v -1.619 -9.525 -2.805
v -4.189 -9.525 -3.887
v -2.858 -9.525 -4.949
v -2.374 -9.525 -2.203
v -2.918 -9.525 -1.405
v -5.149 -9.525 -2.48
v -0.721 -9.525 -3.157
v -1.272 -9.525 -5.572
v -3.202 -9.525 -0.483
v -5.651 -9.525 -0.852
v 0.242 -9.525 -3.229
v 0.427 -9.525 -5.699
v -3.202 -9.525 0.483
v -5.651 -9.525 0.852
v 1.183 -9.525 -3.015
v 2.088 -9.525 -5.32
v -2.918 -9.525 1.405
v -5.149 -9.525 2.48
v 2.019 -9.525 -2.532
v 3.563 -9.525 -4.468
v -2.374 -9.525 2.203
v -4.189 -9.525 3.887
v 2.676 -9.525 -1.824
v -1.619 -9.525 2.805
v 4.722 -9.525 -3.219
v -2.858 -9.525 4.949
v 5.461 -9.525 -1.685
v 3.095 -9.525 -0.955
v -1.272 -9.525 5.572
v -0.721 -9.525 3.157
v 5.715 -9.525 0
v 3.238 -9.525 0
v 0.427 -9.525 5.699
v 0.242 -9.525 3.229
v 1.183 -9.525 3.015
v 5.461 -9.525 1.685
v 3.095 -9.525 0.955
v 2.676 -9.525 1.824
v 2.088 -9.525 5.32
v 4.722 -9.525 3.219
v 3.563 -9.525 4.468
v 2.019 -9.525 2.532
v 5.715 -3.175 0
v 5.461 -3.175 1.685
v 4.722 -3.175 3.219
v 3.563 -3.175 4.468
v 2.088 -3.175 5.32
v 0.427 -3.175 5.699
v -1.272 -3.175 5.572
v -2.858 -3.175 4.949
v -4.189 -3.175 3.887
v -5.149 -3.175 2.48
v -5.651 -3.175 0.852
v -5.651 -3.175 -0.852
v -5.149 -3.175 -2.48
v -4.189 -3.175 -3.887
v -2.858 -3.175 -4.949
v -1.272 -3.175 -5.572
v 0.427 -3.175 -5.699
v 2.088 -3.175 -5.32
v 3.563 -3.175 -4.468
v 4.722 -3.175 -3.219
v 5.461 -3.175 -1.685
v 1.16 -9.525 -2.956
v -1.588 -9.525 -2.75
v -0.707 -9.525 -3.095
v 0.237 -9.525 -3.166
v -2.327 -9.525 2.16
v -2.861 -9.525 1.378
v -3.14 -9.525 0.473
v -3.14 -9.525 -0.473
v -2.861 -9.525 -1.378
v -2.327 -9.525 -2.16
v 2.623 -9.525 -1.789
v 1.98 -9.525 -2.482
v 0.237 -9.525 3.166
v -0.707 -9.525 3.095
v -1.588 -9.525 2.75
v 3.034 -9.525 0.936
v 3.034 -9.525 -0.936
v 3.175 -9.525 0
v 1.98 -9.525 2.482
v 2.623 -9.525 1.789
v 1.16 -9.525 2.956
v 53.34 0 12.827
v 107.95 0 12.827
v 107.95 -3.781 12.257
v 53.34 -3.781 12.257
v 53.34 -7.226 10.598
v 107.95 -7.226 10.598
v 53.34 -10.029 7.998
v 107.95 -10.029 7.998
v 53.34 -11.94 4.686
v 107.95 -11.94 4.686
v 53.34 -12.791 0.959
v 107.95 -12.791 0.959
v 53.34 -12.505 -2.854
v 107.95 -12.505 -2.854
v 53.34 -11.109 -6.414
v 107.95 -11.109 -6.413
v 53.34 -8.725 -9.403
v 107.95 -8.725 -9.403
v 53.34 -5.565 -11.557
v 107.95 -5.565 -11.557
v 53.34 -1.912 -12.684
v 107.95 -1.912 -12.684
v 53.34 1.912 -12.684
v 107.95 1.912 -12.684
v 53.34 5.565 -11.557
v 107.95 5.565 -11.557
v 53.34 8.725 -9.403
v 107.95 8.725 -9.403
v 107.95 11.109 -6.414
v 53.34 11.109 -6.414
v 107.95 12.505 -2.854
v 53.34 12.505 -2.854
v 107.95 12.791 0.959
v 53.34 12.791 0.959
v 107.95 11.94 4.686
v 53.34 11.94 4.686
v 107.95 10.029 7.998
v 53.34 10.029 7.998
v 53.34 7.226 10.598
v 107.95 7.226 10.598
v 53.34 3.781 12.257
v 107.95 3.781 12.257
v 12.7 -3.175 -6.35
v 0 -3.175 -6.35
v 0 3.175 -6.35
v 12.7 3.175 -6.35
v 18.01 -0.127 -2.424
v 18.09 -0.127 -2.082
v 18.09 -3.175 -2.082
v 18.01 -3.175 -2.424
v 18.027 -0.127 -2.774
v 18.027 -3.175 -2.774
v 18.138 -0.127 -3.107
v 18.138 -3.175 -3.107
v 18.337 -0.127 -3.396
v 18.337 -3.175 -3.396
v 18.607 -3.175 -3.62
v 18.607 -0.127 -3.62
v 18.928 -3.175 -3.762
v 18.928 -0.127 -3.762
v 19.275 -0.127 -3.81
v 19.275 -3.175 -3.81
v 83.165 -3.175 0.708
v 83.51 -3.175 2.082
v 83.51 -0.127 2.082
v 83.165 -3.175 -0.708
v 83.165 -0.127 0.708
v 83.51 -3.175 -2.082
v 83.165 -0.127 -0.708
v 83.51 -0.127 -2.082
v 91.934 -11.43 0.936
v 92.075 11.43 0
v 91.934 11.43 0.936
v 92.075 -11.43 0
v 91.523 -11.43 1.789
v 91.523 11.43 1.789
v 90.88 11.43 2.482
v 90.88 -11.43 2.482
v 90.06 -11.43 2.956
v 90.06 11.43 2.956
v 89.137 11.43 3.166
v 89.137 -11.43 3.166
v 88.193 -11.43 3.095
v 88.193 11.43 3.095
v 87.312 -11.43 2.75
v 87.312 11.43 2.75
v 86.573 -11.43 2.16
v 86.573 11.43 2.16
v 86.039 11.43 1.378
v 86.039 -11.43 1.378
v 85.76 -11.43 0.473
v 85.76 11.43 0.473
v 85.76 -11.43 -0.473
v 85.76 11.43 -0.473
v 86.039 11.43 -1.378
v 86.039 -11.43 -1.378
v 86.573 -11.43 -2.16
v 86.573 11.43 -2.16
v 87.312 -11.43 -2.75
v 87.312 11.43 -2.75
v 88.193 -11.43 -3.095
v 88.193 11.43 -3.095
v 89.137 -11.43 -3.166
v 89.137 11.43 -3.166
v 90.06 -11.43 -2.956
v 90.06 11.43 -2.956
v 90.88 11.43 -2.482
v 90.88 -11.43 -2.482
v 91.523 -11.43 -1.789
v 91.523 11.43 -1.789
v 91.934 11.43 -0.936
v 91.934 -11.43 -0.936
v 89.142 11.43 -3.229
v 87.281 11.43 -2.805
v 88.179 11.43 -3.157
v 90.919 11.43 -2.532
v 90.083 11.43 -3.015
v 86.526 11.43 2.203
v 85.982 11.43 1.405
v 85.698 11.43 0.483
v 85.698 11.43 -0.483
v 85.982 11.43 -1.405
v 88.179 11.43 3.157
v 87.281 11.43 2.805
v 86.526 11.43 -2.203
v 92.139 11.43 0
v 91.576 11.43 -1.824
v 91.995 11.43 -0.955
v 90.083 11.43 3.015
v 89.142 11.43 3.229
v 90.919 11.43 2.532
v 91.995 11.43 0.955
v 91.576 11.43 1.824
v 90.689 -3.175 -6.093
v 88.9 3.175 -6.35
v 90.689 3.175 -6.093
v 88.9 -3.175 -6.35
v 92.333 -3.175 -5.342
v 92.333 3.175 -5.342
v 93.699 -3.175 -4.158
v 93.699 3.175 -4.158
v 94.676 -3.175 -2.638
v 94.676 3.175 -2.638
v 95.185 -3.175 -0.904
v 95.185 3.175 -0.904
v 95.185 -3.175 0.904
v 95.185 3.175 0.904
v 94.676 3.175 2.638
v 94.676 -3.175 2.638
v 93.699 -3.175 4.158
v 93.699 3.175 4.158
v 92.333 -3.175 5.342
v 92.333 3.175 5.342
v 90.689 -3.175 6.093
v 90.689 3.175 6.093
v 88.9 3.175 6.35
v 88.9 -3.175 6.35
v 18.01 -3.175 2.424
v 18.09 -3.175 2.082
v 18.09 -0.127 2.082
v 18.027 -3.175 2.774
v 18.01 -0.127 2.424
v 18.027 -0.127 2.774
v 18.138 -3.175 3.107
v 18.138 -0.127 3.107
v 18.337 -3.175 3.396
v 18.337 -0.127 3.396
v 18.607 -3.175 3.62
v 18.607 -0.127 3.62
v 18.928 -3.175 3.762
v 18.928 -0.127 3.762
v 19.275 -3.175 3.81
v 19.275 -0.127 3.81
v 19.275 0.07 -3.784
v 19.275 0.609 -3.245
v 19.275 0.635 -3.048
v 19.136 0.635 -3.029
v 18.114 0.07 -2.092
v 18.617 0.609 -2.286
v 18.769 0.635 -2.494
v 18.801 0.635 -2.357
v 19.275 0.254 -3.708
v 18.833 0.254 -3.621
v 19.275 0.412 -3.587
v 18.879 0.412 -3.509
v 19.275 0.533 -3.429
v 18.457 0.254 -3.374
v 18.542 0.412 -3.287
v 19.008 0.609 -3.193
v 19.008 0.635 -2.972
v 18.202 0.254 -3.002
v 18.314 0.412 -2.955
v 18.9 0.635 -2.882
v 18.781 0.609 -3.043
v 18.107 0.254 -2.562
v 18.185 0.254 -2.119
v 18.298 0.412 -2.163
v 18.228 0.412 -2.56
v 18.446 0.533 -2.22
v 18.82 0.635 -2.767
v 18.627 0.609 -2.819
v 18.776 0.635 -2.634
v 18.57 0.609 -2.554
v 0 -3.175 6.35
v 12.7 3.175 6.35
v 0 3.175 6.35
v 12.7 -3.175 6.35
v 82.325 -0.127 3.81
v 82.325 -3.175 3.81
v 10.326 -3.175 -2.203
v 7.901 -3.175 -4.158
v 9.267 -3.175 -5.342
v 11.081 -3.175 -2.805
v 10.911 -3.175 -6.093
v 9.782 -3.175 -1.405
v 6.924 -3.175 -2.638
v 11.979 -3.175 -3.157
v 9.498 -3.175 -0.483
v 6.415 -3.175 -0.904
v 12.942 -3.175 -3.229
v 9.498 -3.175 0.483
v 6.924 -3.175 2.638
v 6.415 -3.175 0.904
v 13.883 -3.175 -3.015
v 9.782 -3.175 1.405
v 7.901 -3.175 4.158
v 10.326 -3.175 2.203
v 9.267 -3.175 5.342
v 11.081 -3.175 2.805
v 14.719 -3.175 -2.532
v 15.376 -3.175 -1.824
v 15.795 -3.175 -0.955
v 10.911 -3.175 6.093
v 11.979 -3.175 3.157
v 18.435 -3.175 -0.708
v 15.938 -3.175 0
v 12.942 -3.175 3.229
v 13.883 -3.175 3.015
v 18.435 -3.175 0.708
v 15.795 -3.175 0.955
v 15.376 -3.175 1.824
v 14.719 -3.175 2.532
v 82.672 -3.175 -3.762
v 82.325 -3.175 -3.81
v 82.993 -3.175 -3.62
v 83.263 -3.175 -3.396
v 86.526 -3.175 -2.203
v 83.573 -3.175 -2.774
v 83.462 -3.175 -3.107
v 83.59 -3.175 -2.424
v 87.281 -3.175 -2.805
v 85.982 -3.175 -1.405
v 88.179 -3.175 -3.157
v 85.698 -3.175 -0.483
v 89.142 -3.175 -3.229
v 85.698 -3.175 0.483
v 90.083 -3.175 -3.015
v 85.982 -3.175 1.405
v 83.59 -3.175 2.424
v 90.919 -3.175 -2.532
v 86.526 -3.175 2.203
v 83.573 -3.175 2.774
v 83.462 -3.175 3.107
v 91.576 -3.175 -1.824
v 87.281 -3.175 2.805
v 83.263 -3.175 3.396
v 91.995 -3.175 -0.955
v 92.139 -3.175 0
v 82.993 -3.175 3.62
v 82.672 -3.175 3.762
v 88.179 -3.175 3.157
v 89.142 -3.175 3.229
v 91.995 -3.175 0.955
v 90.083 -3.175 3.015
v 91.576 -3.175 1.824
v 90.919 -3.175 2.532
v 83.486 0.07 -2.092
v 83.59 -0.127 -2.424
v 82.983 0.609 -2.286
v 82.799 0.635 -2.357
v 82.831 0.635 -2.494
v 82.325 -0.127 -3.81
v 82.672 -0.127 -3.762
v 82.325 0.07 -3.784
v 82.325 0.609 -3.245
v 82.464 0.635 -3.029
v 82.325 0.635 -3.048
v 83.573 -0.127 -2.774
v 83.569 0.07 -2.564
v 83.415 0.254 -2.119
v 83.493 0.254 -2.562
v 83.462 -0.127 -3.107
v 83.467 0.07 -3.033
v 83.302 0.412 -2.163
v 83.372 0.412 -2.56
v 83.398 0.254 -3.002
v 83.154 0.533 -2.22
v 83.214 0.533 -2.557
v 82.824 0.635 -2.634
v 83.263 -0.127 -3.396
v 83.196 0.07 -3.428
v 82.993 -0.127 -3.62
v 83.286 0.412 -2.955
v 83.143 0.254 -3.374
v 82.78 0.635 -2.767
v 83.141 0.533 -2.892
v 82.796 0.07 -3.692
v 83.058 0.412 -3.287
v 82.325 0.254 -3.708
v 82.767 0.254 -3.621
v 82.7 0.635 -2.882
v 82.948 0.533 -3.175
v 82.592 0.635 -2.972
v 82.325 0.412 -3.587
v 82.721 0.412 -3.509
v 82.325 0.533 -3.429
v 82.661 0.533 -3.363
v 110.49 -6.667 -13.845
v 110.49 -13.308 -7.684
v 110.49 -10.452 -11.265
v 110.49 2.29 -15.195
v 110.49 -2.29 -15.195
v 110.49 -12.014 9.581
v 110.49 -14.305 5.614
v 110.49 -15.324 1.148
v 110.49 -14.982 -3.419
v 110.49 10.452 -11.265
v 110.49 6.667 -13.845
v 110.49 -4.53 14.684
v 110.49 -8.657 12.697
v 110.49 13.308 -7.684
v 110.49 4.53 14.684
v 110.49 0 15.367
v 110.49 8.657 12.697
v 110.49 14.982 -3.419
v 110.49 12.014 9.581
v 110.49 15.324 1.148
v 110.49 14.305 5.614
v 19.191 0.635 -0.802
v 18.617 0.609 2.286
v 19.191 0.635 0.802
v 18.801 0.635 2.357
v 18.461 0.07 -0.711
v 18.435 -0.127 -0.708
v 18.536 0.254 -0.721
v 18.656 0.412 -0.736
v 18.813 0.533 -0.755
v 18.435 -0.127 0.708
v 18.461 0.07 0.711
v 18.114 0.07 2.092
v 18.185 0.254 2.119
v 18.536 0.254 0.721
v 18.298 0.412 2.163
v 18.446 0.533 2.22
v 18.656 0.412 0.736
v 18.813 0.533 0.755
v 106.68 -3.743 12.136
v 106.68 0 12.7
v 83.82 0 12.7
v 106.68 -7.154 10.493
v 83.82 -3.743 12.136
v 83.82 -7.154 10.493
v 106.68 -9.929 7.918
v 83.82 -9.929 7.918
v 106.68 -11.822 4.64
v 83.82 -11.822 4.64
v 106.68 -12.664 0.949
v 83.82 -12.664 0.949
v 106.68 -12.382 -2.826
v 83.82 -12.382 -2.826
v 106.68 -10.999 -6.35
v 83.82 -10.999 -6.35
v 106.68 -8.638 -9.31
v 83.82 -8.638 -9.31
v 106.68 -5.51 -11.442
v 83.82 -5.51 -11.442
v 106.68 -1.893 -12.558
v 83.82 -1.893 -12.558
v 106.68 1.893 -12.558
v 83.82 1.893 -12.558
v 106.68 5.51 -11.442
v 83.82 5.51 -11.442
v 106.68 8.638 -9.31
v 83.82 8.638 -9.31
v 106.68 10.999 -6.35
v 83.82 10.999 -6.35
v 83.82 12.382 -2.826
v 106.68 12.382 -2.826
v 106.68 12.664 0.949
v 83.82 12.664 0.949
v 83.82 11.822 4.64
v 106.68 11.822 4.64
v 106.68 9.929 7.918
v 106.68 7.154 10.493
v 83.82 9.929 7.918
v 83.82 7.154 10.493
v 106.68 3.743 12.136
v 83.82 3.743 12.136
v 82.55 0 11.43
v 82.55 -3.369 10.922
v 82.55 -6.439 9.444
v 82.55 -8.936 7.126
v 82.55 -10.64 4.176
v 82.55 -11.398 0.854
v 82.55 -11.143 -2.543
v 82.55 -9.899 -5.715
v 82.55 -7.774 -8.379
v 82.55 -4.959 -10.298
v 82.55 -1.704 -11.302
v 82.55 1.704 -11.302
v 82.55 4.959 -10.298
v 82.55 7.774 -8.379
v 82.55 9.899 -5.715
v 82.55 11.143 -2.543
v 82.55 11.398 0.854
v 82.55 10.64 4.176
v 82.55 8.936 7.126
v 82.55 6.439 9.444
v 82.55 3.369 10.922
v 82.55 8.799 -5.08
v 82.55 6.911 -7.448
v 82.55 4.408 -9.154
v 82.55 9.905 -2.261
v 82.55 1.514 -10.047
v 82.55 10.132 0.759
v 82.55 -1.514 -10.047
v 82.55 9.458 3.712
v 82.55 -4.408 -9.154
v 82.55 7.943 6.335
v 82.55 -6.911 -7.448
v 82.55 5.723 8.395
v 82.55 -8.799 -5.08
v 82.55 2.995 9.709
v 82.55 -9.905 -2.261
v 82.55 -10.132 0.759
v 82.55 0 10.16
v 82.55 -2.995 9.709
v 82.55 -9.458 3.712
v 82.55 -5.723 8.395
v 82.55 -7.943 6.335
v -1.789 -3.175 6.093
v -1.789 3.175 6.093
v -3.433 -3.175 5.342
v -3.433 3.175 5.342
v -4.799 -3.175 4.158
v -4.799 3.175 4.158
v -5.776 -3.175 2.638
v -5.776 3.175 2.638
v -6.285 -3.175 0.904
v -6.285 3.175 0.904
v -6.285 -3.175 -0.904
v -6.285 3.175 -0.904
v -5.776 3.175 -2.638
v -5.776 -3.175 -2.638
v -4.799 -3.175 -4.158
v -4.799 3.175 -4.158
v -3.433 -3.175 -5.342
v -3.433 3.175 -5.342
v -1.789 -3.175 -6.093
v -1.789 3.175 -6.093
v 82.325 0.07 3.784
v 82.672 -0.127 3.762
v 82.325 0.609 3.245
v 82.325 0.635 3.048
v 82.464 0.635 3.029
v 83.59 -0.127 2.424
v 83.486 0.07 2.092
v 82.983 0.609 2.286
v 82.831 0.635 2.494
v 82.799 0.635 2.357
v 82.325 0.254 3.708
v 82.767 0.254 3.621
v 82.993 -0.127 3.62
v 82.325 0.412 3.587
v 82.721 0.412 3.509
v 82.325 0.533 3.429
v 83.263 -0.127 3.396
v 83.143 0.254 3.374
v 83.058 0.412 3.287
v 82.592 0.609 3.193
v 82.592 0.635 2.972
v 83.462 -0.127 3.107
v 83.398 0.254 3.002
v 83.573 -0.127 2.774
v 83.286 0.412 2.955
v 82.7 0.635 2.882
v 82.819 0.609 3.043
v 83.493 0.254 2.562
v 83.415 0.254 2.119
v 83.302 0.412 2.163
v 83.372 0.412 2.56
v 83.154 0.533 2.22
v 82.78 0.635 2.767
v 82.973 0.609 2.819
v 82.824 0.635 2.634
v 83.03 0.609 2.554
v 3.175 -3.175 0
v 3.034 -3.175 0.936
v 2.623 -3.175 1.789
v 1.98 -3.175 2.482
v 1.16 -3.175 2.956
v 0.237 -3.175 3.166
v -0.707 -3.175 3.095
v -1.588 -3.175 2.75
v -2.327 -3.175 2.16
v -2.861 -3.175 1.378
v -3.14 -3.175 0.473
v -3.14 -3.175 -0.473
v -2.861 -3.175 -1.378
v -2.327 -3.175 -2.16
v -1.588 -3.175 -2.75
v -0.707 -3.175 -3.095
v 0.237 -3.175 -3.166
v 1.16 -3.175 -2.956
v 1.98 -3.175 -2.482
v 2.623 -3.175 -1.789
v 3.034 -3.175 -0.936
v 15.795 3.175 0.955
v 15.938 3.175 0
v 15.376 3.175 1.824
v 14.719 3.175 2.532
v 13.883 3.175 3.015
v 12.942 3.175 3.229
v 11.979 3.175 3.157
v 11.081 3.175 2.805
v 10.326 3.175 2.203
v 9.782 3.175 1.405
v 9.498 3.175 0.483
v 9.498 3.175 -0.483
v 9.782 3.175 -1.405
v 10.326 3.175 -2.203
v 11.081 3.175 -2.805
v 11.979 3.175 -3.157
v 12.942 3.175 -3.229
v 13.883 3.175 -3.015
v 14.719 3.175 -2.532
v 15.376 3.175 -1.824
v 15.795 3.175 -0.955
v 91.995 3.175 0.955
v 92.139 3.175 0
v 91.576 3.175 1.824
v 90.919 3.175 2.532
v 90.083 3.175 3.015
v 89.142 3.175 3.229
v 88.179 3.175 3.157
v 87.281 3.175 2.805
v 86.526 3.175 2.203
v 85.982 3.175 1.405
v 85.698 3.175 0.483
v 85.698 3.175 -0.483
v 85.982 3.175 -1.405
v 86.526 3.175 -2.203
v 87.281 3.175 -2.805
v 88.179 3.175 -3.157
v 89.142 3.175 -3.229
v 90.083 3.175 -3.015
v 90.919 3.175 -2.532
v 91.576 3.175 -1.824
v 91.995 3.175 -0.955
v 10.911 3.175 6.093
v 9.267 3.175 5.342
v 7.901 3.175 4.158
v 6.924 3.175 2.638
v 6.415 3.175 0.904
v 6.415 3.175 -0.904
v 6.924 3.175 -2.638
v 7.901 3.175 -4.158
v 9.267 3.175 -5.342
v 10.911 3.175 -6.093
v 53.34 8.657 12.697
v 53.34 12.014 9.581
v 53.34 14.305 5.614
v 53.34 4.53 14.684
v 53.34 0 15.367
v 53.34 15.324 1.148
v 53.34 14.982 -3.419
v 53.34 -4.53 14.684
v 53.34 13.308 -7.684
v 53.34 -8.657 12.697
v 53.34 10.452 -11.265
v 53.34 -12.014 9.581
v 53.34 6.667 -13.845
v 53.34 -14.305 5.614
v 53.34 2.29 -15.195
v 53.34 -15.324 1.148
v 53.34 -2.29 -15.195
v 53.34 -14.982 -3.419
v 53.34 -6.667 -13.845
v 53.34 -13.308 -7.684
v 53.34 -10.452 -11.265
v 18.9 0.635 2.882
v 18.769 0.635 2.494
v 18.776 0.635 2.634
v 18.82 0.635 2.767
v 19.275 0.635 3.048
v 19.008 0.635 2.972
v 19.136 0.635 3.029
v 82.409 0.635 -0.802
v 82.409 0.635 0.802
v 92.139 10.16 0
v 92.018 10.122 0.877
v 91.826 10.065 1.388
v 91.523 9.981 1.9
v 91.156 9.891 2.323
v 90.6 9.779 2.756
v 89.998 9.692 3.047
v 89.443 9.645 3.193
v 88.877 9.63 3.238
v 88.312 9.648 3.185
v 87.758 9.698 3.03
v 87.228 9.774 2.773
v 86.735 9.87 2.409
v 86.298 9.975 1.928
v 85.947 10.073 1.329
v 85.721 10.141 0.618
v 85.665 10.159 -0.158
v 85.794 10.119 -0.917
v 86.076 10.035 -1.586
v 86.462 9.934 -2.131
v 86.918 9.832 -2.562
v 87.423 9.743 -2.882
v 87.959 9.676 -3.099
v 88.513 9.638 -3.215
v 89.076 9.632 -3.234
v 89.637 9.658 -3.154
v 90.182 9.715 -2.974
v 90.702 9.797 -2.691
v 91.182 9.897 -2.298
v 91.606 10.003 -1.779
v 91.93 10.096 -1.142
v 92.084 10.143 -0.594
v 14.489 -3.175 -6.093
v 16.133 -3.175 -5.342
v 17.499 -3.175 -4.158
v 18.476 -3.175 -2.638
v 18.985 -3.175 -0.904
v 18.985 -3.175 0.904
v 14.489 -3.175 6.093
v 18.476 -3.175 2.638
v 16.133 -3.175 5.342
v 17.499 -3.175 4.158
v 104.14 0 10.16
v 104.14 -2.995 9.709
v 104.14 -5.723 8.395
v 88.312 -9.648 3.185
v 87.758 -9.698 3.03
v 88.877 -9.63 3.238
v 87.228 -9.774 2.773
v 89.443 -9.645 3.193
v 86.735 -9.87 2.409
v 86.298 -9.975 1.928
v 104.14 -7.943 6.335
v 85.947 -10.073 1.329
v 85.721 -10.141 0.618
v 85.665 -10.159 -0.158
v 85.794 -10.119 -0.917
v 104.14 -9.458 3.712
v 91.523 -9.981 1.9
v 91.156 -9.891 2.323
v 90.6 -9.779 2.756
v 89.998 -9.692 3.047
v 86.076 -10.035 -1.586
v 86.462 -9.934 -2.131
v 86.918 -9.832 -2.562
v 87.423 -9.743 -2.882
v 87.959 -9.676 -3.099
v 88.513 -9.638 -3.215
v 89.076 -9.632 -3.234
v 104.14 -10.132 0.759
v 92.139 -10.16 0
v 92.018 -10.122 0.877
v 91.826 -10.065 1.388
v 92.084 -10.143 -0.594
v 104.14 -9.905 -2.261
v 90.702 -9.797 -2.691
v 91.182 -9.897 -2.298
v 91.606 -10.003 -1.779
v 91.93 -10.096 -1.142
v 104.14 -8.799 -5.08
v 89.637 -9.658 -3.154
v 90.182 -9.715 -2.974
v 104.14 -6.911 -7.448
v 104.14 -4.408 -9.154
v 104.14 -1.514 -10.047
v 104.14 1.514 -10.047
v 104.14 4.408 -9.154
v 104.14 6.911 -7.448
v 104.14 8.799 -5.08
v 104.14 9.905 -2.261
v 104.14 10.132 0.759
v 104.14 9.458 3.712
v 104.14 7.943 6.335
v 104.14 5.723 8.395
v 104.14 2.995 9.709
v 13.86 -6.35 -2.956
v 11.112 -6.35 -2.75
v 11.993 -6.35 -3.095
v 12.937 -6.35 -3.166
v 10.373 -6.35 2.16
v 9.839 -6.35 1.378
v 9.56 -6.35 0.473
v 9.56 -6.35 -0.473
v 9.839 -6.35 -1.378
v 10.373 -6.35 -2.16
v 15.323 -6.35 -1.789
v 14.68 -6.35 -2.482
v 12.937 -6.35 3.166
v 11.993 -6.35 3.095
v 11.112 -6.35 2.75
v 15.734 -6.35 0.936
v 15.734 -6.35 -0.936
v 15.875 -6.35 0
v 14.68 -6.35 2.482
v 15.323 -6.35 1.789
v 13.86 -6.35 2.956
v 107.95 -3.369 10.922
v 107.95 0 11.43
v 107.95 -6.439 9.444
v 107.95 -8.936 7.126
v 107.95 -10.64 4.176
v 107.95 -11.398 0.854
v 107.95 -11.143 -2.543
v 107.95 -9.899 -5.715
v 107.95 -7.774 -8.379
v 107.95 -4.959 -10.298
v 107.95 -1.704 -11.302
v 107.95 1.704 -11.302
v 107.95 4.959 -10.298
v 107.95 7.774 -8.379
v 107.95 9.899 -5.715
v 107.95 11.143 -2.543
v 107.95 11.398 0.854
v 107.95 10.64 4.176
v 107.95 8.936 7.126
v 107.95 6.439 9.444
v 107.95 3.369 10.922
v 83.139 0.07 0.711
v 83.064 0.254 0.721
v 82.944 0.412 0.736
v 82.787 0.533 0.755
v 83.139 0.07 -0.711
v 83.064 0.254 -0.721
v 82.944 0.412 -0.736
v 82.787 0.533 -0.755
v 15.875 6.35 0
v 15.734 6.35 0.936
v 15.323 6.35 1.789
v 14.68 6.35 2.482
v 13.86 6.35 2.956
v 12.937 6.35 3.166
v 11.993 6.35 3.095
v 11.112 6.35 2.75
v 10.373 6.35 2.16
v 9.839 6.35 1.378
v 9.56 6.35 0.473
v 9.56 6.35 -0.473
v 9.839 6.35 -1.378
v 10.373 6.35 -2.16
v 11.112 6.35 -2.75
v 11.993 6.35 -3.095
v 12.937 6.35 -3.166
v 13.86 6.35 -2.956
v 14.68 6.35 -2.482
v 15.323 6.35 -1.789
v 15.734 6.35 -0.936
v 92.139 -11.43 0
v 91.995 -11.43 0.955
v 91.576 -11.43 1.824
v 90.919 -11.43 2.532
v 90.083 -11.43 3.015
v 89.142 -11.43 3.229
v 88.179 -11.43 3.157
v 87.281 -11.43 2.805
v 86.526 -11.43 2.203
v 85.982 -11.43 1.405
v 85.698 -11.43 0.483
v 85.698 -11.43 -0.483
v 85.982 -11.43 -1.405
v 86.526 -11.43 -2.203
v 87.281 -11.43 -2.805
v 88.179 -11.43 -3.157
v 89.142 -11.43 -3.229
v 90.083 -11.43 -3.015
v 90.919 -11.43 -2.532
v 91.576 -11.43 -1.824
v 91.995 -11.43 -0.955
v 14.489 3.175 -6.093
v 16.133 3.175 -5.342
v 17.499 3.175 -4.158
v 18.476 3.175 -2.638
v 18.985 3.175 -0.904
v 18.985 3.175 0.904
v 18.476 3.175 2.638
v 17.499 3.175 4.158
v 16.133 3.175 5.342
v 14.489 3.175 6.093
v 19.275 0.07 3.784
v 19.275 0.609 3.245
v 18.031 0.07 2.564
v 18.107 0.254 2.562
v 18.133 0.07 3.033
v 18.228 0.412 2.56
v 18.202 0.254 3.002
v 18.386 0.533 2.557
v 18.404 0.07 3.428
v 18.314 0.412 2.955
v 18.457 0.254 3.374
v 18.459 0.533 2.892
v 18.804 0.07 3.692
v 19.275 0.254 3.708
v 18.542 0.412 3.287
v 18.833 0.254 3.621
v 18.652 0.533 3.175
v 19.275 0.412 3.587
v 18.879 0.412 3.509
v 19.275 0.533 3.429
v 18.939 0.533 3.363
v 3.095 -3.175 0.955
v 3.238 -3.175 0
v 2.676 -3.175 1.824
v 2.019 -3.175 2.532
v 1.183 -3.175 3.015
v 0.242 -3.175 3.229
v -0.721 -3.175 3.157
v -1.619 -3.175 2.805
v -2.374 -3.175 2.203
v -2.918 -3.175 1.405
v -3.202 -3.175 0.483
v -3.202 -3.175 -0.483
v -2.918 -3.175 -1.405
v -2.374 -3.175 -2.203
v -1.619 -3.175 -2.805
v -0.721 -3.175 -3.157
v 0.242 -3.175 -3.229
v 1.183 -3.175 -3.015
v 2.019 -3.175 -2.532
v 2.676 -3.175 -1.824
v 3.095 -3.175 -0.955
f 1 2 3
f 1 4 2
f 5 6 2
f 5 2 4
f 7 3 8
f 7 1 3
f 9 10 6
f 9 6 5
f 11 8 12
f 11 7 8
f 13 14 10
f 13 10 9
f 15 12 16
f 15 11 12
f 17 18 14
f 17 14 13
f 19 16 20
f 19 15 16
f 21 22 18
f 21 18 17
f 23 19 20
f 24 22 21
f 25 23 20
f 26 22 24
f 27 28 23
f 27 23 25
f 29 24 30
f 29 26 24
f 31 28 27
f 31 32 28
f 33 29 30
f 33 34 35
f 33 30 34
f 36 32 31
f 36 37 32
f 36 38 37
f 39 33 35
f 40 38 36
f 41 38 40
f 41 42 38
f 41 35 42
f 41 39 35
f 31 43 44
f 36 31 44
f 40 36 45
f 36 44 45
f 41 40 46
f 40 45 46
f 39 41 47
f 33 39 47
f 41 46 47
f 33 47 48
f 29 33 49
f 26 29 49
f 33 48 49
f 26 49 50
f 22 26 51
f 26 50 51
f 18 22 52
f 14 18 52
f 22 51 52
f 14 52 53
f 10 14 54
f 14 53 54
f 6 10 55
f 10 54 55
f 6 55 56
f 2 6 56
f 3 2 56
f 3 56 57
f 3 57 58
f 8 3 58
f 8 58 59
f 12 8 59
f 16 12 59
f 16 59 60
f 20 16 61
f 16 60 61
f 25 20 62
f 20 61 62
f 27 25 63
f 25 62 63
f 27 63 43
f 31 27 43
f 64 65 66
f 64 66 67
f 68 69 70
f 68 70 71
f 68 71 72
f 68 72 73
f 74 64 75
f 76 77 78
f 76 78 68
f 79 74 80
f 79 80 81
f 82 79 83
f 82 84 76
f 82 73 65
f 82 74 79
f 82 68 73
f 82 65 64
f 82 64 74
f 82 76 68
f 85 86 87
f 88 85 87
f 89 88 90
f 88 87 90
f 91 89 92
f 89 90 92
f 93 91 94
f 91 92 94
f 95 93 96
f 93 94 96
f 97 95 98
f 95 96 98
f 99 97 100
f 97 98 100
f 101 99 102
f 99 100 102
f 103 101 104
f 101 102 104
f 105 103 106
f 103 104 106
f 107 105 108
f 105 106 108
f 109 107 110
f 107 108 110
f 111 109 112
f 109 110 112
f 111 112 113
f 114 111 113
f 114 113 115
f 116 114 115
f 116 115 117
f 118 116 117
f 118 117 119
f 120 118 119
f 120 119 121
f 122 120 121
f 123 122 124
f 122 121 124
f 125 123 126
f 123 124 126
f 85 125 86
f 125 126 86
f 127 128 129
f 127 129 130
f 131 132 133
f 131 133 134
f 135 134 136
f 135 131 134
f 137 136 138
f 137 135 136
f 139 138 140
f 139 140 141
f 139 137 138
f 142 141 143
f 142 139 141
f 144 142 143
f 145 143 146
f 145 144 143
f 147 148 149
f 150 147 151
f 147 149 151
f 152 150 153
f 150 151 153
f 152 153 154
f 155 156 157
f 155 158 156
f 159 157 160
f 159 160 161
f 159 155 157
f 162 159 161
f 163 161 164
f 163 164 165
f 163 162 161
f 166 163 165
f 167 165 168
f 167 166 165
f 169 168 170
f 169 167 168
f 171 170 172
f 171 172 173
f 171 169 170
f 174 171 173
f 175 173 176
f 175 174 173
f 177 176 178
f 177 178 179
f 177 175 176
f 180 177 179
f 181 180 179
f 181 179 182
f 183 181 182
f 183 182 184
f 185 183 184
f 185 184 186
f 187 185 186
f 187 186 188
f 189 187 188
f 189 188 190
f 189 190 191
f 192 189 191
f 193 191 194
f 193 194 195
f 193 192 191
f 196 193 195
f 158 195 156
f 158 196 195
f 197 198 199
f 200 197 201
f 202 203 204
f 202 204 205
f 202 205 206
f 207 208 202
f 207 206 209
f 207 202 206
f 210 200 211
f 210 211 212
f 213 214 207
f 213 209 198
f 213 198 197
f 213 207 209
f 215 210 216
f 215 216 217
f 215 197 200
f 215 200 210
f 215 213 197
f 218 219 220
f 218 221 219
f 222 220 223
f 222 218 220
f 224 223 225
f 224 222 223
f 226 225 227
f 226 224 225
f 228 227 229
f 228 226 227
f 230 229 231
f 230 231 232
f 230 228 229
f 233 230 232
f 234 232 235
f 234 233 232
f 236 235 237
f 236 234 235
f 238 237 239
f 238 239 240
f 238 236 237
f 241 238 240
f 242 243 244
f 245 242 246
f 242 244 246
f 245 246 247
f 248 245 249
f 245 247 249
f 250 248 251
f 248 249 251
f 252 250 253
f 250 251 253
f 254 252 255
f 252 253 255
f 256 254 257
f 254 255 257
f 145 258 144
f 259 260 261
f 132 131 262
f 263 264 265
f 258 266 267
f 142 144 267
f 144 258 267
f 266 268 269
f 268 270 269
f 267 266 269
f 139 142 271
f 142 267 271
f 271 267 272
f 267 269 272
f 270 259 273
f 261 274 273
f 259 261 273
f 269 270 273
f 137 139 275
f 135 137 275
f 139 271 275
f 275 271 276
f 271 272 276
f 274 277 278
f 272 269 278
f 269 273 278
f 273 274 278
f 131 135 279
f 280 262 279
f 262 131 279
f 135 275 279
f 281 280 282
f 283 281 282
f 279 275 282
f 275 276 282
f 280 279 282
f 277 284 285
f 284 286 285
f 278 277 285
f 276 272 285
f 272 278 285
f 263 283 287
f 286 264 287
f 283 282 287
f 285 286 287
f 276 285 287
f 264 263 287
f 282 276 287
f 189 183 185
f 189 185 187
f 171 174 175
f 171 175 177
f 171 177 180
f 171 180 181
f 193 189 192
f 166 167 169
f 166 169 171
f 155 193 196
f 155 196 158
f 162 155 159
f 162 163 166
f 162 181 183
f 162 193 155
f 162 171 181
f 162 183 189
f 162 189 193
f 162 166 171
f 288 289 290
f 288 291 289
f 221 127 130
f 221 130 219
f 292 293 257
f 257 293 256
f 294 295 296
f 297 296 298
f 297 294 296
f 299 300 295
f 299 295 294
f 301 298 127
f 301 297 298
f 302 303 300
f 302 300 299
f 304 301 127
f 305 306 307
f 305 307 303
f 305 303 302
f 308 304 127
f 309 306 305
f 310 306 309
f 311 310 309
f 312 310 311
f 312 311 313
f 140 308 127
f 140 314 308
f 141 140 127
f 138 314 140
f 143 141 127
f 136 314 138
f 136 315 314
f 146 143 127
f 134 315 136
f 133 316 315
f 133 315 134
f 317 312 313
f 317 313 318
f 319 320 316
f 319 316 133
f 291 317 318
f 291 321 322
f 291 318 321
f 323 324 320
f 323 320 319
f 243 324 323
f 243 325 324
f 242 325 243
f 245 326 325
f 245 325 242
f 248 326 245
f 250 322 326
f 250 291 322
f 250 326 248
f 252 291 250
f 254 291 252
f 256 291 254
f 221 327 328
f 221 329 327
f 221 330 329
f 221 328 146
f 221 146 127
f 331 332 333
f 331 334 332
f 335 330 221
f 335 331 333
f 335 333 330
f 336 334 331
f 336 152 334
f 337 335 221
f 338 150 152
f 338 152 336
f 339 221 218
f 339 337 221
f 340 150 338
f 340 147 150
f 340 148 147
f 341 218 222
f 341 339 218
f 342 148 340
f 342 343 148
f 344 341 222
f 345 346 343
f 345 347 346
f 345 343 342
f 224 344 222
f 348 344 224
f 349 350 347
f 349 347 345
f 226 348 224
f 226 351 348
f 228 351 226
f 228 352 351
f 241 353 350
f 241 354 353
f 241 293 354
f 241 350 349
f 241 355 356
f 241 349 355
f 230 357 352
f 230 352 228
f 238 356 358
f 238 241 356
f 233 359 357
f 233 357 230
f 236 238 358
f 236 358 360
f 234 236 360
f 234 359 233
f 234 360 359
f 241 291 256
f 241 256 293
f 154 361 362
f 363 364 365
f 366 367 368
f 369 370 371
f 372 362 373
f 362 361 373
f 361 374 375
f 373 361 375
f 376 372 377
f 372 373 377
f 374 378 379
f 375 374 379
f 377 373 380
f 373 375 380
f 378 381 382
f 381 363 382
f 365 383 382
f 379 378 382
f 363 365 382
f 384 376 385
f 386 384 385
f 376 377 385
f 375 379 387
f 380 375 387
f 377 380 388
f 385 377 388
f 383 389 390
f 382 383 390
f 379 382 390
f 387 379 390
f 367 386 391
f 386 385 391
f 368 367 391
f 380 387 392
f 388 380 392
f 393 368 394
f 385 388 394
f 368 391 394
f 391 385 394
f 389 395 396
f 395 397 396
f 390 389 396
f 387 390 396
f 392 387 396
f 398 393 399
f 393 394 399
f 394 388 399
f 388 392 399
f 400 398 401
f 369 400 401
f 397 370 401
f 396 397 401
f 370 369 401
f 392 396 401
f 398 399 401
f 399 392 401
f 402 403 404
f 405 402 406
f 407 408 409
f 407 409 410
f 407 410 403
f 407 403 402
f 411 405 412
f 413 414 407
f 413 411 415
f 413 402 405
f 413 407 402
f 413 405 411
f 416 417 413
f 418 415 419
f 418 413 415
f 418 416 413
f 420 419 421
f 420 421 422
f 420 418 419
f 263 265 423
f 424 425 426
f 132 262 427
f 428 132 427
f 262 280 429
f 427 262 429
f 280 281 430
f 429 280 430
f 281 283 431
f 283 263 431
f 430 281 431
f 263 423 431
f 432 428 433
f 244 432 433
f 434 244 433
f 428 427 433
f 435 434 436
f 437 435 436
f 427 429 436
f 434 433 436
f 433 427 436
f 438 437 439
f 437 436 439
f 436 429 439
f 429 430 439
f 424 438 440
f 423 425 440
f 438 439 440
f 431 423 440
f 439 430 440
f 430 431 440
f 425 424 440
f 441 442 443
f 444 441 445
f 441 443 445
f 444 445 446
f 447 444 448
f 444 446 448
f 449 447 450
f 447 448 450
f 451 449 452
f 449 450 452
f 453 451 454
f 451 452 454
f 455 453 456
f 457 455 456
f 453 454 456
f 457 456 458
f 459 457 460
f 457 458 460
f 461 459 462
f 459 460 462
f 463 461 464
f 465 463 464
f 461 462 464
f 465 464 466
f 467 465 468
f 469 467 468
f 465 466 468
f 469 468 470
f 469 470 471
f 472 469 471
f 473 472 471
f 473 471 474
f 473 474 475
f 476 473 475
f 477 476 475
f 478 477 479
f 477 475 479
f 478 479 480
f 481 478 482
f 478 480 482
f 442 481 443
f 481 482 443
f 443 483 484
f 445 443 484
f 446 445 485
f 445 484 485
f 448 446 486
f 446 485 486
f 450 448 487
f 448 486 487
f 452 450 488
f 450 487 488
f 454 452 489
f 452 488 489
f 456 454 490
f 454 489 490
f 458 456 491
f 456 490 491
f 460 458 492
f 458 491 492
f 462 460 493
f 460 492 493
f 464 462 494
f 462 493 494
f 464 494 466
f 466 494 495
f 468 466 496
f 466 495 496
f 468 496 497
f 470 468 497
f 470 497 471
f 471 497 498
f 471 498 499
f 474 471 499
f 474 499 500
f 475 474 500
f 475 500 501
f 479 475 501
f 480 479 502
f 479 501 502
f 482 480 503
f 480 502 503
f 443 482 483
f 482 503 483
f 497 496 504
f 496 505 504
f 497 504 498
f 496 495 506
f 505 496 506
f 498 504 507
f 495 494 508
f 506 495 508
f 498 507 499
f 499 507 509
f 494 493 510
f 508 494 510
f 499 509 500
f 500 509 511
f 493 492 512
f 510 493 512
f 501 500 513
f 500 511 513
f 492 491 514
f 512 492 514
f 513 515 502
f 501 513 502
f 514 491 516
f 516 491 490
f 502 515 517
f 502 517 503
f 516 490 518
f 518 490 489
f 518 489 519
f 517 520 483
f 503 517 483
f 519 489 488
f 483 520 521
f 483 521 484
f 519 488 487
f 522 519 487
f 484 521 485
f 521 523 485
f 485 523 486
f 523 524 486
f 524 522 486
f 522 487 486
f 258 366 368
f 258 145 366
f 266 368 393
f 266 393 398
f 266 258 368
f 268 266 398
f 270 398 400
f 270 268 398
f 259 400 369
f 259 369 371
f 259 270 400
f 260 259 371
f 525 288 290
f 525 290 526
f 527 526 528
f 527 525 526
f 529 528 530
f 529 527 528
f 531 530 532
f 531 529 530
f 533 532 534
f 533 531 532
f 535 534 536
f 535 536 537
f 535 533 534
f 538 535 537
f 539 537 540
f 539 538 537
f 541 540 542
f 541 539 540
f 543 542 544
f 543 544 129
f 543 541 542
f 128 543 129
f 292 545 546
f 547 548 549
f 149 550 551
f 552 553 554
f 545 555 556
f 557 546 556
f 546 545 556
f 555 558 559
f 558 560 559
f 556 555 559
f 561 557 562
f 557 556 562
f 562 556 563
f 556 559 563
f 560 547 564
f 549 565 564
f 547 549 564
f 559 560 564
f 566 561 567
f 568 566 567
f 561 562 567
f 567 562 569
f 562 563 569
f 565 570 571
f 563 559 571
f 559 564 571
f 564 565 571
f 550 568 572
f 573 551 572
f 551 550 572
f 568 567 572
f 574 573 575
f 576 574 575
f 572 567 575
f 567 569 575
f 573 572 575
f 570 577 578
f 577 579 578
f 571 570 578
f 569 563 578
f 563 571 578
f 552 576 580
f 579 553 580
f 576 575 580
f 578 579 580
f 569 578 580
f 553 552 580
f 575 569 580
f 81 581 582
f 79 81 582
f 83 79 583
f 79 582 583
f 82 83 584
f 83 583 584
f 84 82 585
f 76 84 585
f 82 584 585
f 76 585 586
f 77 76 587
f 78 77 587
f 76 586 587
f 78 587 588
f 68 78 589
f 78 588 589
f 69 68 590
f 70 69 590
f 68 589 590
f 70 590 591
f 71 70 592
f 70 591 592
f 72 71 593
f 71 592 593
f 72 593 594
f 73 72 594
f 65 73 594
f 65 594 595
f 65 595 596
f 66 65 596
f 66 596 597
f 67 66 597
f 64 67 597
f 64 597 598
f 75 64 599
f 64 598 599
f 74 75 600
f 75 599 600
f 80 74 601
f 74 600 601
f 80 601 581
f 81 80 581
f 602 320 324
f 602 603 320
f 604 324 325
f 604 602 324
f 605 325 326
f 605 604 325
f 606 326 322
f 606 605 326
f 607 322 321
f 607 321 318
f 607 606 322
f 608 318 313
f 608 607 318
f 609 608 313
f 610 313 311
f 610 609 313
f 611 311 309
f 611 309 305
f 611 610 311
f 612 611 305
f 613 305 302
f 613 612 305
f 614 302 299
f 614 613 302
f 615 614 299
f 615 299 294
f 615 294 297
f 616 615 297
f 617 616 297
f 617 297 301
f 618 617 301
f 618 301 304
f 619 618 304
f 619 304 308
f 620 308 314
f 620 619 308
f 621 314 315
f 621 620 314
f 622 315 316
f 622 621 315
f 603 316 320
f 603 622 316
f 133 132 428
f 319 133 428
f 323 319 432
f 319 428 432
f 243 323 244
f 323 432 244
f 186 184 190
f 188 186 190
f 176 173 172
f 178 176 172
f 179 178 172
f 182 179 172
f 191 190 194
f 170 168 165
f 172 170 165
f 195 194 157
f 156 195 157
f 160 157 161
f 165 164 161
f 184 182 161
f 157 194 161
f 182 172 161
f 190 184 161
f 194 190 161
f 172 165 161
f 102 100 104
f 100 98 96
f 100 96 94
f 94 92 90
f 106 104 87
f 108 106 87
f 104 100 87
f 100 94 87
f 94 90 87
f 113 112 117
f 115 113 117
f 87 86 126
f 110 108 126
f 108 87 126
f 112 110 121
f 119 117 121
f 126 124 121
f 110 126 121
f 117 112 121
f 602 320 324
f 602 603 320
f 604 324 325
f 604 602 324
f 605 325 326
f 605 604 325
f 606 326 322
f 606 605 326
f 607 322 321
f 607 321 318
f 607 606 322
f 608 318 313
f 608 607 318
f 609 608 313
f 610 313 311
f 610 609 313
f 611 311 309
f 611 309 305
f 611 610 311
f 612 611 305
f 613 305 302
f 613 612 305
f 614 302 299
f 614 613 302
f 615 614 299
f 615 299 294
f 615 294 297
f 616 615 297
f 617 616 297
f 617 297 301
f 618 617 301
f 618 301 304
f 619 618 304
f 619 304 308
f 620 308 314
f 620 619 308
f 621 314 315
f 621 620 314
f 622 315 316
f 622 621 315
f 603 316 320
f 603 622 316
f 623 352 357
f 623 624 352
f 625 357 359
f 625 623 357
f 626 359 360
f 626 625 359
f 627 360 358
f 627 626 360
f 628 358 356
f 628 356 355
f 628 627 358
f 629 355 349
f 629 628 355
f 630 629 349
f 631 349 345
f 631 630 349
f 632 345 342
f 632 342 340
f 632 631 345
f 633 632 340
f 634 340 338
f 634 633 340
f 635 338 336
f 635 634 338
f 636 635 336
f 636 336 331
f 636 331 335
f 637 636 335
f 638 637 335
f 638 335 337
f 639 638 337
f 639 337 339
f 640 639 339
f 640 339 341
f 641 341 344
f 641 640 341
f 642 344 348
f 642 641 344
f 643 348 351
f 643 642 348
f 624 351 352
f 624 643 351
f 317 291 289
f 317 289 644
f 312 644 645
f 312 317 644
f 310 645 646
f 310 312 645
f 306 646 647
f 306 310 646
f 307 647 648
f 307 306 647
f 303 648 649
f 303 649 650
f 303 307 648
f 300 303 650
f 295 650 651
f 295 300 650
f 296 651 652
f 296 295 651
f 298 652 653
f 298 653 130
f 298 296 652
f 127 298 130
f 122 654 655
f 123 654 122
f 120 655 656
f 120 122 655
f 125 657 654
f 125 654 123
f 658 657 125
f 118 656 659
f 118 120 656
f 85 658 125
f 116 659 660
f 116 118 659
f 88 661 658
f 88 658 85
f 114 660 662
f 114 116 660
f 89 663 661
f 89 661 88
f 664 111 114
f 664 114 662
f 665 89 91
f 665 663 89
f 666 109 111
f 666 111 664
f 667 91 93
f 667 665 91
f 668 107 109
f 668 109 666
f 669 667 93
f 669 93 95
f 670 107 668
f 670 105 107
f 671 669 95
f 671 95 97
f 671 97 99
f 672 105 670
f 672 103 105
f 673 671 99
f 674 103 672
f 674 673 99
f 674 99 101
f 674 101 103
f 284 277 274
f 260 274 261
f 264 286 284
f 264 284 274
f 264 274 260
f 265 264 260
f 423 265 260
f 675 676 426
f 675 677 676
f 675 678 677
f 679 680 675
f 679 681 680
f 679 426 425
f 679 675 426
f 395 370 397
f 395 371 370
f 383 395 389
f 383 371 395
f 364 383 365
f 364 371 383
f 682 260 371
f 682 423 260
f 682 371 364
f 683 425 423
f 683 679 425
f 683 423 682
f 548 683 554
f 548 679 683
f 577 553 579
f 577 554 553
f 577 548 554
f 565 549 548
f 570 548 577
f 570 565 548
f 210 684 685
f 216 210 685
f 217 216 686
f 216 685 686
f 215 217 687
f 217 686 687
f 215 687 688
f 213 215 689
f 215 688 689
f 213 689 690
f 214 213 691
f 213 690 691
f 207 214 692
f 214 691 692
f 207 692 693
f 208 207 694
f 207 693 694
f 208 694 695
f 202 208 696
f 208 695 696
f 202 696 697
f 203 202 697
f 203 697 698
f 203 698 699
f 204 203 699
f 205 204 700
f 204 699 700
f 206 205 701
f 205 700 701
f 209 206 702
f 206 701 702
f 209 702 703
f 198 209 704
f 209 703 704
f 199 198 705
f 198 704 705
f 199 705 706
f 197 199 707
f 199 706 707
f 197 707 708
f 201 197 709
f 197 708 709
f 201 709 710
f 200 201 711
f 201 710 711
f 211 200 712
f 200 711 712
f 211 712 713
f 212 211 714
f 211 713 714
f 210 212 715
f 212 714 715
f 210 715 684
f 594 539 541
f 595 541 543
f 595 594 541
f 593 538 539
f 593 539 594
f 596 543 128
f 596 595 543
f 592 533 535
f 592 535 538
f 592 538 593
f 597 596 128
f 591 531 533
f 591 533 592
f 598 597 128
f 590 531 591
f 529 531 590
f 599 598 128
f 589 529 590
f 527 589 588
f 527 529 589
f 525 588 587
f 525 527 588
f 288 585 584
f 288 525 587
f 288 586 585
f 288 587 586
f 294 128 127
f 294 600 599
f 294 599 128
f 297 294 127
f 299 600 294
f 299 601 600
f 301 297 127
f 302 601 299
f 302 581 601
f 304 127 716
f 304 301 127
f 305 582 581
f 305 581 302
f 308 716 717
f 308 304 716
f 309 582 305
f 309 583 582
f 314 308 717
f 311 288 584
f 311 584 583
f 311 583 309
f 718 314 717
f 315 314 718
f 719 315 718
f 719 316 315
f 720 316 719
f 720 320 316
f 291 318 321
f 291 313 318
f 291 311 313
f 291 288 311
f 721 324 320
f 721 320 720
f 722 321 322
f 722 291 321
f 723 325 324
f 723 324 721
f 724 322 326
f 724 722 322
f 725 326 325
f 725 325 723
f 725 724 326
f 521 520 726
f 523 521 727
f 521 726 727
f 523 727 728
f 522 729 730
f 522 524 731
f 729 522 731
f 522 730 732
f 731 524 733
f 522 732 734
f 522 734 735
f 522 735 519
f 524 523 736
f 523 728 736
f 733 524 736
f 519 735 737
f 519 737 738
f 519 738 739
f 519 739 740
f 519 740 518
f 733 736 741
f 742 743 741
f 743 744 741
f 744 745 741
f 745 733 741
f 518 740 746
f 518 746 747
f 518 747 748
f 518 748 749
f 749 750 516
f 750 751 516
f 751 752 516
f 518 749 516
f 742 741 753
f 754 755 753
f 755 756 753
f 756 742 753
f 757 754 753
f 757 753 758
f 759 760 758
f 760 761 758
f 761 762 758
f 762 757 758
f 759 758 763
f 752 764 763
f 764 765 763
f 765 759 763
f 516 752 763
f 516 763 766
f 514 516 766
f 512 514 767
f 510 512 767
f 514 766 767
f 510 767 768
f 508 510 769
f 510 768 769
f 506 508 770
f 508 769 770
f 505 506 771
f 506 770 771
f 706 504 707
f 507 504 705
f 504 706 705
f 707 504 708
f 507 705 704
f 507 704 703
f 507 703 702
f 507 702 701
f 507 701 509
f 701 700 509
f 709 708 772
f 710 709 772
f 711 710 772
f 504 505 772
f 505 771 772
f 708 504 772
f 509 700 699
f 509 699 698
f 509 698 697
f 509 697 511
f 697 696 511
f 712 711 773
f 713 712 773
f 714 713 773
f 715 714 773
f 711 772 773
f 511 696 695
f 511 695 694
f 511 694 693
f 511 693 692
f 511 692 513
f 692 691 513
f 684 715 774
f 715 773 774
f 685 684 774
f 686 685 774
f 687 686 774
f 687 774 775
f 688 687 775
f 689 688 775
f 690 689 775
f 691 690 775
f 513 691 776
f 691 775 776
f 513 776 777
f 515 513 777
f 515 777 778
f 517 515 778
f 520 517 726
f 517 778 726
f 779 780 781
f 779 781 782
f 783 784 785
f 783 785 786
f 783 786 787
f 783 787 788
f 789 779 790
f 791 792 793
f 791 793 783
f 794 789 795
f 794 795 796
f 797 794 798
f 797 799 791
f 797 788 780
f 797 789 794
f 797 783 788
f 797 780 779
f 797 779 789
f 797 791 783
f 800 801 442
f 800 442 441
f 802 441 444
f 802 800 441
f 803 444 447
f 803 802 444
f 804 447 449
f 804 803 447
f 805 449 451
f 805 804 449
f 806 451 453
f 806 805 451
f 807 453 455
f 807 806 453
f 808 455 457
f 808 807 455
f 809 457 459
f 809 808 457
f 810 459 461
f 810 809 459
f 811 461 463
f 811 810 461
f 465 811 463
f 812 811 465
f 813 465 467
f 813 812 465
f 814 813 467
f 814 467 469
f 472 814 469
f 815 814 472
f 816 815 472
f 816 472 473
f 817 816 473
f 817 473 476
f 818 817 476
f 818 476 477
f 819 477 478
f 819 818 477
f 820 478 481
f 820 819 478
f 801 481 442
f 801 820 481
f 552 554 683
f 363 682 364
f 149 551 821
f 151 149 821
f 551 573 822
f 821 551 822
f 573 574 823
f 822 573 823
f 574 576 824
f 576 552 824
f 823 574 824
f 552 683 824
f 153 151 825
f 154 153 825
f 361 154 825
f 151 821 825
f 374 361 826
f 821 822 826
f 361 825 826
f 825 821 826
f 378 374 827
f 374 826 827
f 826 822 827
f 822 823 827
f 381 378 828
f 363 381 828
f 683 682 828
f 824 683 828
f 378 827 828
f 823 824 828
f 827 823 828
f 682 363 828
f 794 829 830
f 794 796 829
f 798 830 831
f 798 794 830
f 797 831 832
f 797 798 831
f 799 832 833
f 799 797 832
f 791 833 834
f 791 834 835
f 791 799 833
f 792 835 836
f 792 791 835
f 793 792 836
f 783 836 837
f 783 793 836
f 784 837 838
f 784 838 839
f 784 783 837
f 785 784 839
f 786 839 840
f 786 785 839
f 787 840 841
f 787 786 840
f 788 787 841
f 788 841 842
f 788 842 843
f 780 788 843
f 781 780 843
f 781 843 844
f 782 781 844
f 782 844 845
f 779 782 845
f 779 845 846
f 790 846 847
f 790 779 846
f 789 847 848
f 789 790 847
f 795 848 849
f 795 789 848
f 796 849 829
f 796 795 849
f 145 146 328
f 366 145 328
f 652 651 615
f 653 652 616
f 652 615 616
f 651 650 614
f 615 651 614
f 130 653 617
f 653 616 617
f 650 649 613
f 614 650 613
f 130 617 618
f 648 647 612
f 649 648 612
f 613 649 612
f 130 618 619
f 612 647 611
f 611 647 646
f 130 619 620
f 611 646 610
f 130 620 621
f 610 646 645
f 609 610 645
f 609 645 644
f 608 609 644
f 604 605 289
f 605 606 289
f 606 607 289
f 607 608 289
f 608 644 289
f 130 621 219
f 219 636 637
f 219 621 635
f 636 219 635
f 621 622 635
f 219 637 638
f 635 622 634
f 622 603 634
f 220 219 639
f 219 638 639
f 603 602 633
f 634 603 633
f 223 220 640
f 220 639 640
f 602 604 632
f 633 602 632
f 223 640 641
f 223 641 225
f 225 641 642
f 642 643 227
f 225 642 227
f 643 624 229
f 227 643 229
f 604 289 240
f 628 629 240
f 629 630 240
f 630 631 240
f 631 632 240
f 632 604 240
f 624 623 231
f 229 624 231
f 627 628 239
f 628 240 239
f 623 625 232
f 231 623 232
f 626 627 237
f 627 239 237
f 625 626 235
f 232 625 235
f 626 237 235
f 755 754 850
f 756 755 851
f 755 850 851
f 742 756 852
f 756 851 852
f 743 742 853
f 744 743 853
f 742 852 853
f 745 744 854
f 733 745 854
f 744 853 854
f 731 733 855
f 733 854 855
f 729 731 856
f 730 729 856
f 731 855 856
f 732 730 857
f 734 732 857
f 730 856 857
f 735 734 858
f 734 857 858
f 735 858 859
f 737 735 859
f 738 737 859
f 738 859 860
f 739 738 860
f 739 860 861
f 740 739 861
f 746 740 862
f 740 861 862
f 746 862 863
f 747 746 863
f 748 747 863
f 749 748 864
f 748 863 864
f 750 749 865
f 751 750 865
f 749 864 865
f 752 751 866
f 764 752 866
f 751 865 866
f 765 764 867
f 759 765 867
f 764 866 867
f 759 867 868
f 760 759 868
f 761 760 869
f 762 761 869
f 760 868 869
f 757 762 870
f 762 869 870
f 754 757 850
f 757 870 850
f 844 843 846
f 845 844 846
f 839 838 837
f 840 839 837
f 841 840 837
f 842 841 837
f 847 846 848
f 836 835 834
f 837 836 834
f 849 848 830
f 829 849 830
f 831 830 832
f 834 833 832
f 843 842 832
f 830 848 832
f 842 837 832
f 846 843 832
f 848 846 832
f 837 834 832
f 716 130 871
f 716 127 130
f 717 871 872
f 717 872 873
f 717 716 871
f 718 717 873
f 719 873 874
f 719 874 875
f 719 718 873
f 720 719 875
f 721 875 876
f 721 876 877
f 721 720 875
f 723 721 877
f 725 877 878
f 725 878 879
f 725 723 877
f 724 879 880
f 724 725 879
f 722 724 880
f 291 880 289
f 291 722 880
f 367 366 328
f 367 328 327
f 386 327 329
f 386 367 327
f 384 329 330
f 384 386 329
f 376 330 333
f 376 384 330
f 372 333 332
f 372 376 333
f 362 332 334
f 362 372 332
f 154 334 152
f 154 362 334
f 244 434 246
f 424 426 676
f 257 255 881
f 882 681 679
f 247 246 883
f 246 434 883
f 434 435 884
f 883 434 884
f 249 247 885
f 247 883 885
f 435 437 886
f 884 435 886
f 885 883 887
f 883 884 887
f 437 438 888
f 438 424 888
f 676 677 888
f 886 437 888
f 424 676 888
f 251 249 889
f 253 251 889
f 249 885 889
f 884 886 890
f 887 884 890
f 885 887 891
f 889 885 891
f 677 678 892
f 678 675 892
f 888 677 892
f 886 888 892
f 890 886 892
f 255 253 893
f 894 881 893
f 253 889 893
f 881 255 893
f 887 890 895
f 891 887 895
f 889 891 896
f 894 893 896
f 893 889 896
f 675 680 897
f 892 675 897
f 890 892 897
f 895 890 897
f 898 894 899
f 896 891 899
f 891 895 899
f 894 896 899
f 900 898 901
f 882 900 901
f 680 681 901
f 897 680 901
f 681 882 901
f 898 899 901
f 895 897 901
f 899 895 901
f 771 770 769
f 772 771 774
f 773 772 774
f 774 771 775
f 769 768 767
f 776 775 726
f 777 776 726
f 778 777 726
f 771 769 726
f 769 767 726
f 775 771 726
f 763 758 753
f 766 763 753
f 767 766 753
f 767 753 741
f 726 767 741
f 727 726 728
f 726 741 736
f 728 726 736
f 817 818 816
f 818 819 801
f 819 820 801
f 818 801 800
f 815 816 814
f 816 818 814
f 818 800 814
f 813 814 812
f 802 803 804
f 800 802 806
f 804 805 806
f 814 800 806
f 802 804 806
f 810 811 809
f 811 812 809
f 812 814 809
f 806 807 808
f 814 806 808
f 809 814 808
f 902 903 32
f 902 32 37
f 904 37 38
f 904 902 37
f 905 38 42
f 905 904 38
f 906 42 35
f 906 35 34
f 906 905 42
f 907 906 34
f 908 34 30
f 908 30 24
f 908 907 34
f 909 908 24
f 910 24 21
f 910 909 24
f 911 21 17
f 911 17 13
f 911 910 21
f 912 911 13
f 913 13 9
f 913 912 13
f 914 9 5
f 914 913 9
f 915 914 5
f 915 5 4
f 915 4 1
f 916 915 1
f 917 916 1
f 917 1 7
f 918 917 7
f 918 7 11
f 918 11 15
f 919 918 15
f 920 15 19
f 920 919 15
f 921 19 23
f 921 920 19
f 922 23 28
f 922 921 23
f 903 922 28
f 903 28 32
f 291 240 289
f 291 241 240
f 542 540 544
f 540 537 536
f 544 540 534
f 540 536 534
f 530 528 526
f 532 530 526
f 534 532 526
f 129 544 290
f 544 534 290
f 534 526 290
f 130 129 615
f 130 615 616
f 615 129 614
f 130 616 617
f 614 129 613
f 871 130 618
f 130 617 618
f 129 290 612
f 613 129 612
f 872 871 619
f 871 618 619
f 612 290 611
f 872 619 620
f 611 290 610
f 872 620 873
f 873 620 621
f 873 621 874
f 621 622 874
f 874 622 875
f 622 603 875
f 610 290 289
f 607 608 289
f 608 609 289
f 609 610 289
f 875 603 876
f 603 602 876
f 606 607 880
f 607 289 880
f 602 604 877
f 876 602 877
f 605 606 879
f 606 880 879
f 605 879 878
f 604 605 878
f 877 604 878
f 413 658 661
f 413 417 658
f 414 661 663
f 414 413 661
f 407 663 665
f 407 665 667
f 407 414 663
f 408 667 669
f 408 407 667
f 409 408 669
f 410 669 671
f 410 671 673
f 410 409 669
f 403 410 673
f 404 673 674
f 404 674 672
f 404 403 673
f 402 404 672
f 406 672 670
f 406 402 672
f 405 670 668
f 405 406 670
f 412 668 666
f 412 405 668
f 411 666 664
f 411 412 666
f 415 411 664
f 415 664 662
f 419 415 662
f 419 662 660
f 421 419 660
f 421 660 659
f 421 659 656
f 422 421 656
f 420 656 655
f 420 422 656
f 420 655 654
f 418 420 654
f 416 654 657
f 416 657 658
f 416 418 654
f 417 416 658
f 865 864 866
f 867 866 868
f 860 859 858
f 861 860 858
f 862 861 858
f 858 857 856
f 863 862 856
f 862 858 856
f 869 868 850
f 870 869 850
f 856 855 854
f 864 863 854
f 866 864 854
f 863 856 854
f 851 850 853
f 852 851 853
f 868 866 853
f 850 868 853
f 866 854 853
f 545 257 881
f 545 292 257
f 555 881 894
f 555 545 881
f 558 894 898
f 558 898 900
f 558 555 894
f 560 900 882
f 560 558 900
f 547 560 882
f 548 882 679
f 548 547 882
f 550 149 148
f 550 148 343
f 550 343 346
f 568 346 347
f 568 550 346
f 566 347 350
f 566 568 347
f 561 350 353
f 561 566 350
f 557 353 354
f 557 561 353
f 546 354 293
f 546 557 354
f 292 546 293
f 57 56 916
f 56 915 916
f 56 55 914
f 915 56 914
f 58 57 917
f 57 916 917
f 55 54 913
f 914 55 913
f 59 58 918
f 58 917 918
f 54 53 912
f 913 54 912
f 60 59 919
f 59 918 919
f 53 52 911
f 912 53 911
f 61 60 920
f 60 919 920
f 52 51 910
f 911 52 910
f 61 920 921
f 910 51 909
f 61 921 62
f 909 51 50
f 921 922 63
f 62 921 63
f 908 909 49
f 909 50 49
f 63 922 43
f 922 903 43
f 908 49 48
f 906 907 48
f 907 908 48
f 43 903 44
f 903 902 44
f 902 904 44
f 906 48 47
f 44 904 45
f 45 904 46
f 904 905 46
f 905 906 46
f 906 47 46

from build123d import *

# Parameters (mm, degrees)
F4_W      = 57.15
F4_H      = 2.54
F3_R      = 3.175
F6_DEPTH  = 6.35
F0_R      = 3.2385
F7_DEPTH  = 3.175
F1_R      = 3.2385
F24_DEPTH = 3.175
F9_R      = 3.2385
F10_DEPTH = 11.43
F12_R     = 3.175
F13_DEPTH = 11.43
F14_SIZE  = 1.27
F15_T     = -2.54
F16_R     = 1.27
F17_R     = 0.762
F18_R     = 3.175
F19_DEPTH = 6.35
F20_R     = 5.715
F20_R_2   = 3.2385
F21_DEPTH = 6.35
F22_R     = 12.827
F23_DEPTH = 2.54


with BuildPart() as f5:
    # F4 (on Front) → F5 (revolve)
    with BuildSketch(Plane.XZ):
        with Locations((81.915, 14.097)):
            Rectangle(F4_W, F4_H)
    revolve(axis=Axis((44.45, 0, 0), (1, 0, 0)))

    # F22 (on face) → F23 (join)
    with BuildSketch(Plane.YZ.offset(110.49)):
        Circle(F22_R)
    extrude(amount=-F23_DEPTH)


with BuildPart() as f6:
    # F3 (on Front) → F6 (new body, symmetric)
    with BuildSketch(Plane.XZ):
        with Locations((12.7, 0)):
            Circle(F3_R)
    extrude(amount=F6_DEPTH, both=True)


with BuildPart() as f7:
    # F0 (on Front) → F7 (new body, symmetric)
    with BuildSketch(Plane.XZ):
        with BuildLine():
            Line((12.7, 6.35), (0, 6.35))
            ThreePointArc((0, 6.35), (-6.35, 0), (0, -6.35))
            Line((0, -6.35), (12.7, -6.35))
            ThreePointArc((12.7, -6.35), (19.05, 0), (12.7, 6.35))
        make_face()
        with Locations((12.7, 0)):
            Circle(F0_R, mode=Mode.SUBTRACT)
    extrude(amount=F7_DEPTH, both=True)

    # F18 (on face) → F19 (join)
    with BuildSketch(Plane.XZ.offset(3.175)):
        Circle(F18_R)
    extrude(amount=F19_DEPTH)


with BuildPart() as f24:
    # F1 (on Front) → F24 (new body, symmetric)
    with BuildSketch(Plane.XZ):
        with BuildLine():
            Line((88.9, 6.35), (12.7, 6.35))
            ThreePointArc((12.7, 6.35), (6.35, 0), (12.7, -6.35))
            Line((12.7, -6.35), (88.9, -6.35))
            ThreePointArc((88.9, -6.35), (95.25, 0), (88.9, 6.35))
        make_face()
        with Locations((12.7, 0)):
            Circle(F1_R, mode=Mode.SUBTRACT)
        with Locations((88.9, 0)):
            Circle(F1_R, mode=Mode.SUBTRACT)
    extrude(amount=F24_DEPTH, both=True)

    # F15
    f15_openings = [f24.faces().sort_by_distance(p)[0] for p in [
        (50.8, -3.175, 0),
    ]]
    offset(amount=F15_T, openings=f15_openings, kind=Kind.INTERSECTION)

    # F16
    f16_edges = [f24.edges().sort_by_distance(p)[0] for p in [
        (84.555468, -1.27, -3.81),
        (17.044532, -1.27, -3.81),
        (84.555468, -1.27, 3.81),
        (17.044532, -1.27, 3.81),
    ]]
    fillet(f16_edges, radius=F16_R)

    # F17
    f17_edges = [f24.edges().sort_by_distance(p)[0] for p in [
        (50.8, 0.635, -3.81),
        (83.372474, 0.635, -3.258218),
        (18.227526, 0.635, -3.258218),
        (83.1215, 0.635, 0),
        (18.380611, 0.635, -1.059113),
        (83.372474, 0.635, 3.258218),
        (18.380611, 0.635, 1.059113),
        (50.8, 0.635, 3.81),
        (18.227526, 0.635, 3.258218),
    ]]
    fillet(f17_edges, radius=F17_R)


with BuildPart() as f8:
    # F2 (on Front) → F8 (revolve)
    with BuildSketch(Plane.XZ):
        Polygon((107.95, 12.7), (82.55, 12.7), (82.55, 10.16), (104.14, 10.16), (104.14, 0), (107.95, 0), align=None)
    revolve(axis=Axis((44.45, 0, 0), (1, 0, 0)))


with BuildPart() as f10:
    # F9 (on Front) → F10 (new body, symmetric)
    with BuildSketch(Plane.XZ):
        with Locations((88.9, 0)):
            Circle(F9_R)
    extrude(amount=F10_DEPTH, both=True)


with BuildPart() as f8_1:
    add(f8.part)

    # F11: cut F10
    add(f10.part, mode=Mode.SUBTRACT)

    # F14
    f14_edges = [f8_1.edges().sort_by_distance(p)[0] for p in [
        (107.95, 0, -12.7),
        (82.55, 0, -12.7),
    ]]
    chamfer(f14_edges, length=F14_SIZE)


with BuildPart() as f13:
    # F12 (on Front) → F13 (new body, symmetric)
    with BuildSketch(Plane.XZ):
        with Locations((88.9, 0)):
            Circle(F12_R)
    extrude(amount=F13_DEPTH, both=True)


with BuildPart() as f21:
    # F20 (on face) → F21 (new body)
    with BuildSketch(Plane.XZ.offset(3.175)):
        Circle(F20_R)
        Circle(F20_R_2, mode=Mode.SUBTRACT)
    extrude(amount=F21_DEPTH)


solid = Compound([f5.part, f6.part, f7.part, f24.part, f8_1.part, f13.part, f21.part])
